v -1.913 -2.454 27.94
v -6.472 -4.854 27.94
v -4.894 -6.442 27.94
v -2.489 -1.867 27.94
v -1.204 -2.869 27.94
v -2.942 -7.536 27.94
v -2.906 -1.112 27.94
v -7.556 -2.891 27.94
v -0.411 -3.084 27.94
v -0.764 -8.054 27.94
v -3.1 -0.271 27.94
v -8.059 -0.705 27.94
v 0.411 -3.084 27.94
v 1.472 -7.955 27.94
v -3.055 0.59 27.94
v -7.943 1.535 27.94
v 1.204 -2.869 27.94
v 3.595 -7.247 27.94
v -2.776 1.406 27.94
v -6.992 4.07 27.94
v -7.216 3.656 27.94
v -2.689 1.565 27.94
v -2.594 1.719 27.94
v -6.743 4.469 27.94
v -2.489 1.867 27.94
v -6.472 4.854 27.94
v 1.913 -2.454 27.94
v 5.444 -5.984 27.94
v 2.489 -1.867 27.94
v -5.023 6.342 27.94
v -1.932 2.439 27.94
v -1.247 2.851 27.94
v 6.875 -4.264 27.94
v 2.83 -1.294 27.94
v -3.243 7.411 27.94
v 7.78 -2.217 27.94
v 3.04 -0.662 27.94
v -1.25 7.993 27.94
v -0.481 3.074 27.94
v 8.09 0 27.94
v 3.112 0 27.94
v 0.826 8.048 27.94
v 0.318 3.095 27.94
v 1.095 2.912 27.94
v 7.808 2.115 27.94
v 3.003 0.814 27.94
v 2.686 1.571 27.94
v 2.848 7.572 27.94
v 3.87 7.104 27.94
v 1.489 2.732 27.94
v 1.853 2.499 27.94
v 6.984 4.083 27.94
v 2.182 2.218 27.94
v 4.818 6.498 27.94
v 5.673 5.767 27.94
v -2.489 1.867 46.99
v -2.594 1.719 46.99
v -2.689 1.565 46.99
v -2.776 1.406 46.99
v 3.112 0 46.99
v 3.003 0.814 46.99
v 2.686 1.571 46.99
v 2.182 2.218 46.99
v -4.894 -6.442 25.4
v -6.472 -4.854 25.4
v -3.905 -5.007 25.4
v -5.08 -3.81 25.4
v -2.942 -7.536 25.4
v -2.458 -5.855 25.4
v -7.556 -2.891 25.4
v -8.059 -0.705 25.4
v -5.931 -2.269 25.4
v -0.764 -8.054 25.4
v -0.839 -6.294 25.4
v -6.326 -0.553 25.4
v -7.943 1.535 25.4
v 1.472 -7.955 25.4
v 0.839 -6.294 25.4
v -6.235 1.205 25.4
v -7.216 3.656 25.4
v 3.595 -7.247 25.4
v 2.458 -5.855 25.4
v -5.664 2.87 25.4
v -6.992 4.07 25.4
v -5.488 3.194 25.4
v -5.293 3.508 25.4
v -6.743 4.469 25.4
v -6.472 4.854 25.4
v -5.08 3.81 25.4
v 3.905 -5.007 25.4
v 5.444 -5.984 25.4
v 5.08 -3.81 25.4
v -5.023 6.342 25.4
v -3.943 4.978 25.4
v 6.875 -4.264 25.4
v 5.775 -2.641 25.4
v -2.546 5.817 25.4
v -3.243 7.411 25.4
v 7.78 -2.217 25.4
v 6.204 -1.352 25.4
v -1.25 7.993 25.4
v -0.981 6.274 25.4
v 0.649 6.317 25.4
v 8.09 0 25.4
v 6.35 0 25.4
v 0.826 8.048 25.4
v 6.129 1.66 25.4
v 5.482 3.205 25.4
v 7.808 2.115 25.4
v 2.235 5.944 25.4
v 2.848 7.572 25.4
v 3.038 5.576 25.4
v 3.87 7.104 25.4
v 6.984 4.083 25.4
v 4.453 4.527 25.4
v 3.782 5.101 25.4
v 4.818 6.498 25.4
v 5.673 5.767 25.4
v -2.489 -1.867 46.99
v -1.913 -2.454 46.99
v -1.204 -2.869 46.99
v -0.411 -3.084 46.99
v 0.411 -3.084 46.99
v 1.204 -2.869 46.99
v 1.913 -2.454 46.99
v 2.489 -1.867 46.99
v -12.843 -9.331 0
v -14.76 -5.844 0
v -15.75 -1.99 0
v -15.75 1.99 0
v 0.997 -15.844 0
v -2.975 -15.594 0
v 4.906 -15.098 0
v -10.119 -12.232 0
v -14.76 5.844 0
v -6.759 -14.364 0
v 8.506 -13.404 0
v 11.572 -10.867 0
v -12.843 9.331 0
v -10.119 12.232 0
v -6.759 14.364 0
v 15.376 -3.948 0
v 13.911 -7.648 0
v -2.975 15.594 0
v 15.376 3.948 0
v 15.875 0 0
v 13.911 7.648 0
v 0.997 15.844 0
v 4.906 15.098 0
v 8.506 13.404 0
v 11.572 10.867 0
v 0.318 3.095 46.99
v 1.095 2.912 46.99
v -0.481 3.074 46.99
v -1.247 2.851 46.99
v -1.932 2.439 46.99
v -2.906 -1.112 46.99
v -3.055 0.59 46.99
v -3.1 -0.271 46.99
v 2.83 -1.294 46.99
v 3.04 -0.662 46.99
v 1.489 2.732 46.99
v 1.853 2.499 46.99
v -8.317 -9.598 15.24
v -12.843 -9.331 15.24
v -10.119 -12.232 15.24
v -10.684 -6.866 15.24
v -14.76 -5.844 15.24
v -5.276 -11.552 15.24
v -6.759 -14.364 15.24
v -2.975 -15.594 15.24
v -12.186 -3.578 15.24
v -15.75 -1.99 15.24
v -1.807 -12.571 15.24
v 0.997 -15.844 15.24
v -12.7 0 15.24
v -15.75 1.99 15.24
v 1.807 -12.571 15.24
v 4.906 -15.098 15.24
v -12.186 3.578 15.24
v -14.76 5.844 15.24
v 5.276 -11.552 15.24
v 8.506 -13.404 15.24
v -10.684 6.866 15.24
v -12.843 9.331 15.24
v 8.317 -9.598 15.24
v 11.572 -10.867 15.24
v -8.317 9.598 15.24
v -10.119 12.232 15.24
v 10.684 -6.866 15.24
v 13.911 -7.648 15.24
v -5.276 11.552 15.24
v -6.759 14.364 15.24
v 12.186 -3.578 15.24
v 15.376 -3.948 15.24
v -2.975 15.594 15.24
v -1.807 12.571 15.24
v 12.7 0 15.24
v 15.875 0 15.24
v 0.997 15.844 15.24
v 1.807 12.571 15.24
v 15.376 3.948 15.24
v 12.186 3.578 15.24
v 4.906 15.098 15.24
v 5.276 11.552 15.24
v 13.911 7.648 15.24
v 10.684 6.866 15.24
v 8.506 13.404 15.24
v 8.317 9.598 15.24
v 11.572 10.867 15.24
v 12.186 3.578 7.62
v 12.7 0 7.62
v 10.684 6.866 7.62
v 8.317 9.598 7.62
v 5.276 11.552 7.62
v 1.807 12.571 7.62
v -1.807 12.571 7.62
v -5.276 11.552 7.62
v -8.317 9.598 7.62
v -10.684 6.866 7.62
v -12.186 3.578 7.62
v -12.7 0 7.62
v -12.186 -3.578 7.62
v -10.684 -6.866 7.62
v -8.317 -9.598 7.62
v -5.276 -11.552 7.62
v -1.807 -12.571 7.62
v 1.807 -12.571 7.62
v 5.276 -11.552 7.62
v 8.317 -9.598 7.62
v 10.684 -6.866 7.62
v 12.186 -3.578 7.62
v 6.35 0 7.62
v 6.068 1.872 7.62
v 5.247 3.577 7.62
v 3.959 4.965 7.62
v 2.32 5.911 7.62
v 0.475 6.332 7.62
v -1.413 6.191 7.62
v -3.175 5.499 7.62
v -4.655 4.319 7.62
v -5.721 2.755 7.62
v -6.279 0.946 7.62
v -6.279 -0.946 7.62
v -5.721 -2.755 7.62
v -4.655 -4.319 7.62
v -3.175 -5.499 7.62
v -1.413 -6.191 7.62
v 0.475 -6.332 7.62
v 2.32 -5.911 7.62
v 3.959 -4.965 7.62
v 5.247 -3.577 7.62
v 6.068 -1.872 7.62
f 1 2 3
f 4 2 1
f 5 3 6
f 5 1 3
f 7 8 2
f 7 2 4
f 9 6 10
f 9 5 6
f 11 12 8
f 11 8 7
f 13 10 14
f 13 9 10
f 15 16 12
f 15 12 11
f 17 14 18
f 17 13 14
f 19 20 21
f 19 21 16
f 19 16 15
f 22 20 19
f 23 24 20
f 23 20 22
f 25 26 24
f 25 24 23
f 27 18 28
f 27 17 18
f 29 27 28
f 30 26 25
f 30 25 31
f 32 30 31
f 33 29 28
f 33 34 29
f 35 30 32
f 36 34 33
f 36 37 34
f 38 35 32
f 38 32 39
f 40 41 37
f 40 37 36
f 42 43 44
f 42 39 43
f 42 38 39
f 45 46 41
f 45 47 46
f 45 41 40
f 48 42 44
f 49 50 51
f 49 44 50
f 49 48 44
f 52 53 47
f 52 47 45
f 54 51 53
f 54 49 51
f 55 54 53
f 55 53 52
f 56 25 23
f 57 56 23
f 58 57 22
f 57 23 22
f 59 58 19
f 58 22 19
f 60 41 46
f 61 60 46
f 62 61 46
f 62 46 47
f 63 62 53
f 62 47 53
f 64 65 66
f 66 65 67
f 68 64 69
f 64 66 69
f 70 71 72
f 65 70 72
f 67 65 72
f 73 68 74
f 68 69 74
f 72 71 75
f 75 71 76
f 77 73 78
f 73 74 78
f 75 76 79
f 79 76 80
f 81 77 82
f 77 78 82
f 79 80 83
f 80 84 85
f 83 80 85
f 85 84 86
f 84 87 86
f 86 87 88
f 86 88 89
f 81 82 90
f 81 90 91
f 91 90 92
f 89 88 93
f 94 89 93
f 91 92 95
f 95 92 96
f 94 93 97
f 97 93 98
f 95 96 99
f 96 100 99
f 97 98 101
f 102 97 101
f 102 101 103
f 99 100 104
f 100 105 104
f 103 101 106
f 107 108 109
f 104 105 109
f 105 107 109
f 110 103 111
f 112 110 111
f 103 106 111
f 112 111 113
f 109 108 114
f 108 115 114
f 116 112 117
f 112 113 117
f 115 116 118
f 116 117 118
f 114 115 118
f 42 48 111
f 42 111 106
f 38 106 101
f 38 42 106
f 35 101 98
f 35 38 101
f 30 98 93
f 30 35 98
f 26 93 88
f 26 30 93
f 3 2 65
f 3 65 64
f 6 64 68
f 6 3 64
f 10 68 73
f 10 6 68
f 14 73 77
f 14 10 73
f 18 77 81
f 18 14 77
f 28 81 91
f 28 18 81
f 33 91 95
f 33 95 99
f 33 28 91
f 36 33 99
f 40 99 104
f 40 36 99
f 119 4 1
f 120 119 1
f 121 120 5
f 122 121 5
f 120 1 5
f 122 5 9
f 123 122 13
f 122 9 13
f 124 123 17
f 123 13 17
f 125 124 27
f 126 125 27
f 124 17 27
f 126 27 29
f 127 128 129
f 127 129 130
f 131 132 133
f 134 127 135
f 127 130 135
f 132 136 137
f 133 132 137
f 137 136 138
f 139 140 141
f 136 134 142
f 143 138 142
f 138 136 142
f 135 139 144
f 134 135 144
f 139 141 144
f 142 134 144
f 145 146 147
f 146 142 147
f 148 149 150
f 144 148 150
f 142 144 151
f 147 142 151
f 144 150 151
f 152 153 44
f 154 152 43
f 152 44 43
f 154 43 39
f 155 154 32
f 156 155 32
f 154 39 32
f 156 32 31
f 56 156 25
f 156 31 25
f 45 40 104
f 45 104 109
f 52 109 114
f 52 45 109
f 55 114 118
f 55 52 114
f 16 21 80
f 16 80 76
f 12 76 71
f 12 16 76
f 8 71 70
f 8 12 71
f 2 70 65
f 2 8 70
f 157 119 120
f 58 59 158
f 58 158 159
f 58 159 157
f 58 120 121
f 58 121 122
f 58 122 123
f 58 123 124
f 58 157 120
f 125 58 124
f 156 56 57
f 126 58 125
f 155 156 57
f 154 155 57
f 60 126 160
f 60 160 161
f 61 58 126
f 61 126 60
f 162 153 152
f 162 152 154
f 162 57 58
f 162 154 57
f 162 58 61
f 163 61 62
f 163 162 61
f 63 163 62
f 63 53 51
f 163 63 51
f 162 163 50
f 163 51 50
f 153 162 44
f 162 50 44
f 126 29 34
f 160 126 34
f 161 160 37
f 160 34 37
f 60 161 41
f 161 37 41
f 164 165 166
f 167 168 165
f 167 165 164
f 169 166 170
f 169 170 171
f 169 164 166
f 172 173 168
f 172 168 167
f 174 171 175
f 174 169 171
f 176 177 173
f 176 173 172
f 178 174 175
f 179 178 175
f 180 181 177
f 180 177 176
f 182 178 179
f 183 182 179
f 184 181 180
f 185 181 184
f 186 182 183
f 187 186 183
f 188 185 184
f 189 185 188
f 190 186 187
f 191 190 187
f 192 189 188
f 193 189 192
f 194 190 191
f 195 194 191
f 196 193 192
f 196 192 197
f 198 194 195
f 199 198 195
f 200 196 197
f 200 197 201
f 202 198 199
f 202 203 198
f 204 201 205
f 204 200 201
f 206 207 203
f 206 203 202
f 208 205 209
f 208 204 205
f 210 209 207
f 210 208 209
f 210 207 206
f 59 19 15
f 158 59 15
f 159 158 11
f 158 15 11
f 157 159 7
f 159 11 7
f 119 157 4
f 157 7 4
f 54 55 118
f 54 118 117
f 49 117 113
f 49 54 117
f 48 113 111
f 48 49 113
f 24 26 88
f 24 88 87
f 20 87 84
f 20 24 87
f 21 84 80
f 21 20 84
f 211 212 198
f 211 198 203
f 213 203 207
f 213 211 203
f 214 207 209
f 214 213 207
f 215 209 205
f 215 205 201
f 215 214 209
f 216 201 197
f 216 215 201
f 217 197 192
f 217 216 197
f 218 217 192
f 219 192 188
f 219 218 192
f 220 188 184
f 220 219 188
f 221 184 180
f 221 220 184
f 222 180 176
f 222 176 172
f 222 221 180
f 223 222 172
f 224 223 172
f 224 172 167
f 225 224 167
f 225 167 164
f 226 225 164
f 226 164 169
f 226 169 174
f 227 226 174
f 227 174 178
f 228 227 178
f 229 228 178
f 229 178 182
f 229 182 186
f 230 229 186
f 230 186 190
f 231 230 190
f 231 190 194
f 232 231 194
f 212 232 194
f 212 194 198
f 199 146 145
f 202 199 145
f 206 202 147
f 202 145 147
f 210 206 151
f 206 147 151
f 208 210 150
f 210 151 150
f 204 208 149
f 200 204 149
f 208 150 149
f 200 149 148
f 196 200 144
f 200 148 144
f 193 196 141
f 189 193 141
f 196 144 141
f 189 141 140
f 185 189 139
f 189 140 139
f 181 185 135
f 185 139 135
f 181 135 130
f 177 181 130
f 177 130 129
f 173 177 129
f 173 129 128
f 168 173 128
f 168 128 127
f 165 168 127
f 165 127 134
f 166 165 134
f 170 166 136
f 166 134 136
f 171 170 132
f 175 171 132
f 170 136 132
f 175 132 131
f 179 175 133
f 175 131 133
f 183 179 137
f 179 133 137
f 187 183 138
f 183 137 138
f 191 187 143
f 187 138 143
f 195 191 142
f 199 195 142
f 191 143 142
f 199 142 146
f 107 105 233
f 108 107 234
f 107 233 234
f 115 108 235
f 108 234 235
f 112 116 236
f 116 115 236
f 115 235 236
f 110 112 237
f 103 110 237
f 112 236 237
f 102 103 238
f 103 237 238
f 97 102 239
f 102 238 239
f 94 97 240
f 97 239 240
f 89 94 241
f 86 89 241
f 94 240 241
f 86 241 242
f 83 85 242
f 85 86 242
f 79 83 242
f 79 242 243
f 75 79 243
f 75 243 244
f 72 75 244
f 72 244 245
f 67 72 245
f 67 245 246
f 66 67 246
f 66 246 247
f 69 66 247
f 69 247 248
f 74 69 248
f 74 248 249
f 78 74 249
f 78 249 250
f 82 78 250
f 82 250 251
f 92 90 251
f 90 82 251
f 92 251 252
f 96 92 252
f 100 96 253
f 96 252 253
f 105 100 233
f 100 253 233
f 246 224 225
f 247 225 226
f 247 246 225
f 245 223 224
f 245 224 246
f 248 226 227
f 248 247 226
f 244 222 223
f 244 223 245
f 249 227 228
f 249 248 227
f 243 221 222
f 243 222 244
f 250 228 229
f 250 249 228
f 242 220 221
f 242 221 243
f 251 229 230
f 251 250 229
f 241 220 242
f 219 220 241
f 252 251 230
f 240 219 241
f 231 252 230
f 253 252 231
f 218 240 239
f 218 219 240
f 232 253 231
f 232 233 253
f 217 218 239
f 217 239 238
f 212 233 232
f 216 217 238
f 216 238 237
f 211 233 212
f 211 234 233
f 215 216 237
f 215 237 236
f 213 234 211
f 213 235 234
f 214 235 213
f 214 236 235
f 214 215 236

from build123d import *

# Parameters (mm, degrees)
F0_R     = 12.7
F0_R_2   = 6.35
F1_DEPTH = 7.62
F0_R_3   = 15.875
F2_DEPTH = 15.24
F3_DEPTH = 27.94
F5_DEPTH = 19.05
F6_DEPTH = 2.54


with BuildPart() as f1:
    # F0 (on Top) → F1 (new body)
    with BuildSketch(Plane.XY):
        Circle(F0_R)
        Circle(F0_R_2, mode=Mode.SUBTRACT)
    extrude(amount=F1_DEPTH)

    # F0 (on Top) → F2 (join)
    with BuildSketch(Plane.XY):
        Circle(F0_R_3)
        Circle(F0_R, mode=Mode.SUBTRACT)
    extrude(amount=F2_DEPTH)

    # F0 (on Top) → F3 (join)
    with BuildSketch(Plane.XY):
        Circle(F0_R_2)
    extrude(amount=F3_DEPTH)

    # F4 (on face) → F5 (join)
    with BuildSketch(Plane.XY.offset(27.94)):
        with BuildLine():
            Line((0, 0), (2.4892, -1.8669))
            ThreePointArc((2.4892, -1.8669), (2.9518280819, -0.983942694), (3.1115, 0))
            ThreePointArc((3.1115, 0), (2.8697186557, 1.2025585587), (2.1819502092, 2.2182257628))
            Line((2.1819502092, 2.2182257628), (0, 0))
        make_face()
        with BuildLine():
            ThreePointArc((2.1819502092, 2.2182257628), (1.6749519392, 2.6222067522), (1.095248, 2.912364))
            Line((1.095248, 2.912364), (0, 0))
            Line((0, 0), (2.1819502092, 2.2182257628))
        make_face()
        with BuildLine():
            ThreePointArc((-2.7755672417, 1.4062925502), (-3.0996598031, -0.2711850936), (-2.4892, -1.8669))
            Line((-2.4892, -1.8669), (0, 0))
            Line((0, 0), (-2.7755672417, 1.4062925502))
        make_face()
        with BuildLine():
            Line((0, 0), (-2.4892, 1.8669))
            ThreePointArc((-2.4892, 1.8669), (-2.6424388986, 1.642847807), (-2.7755672417, 1.4062925502))
            Line((-2.7755672417, 1.4062925502), (0, 0))
        make_face()
        with BuildLine():
            Line((0, 0), (1.095248, 2.912364))
            ThreePointArc((1.095248, 2.912364), (-0.87122, 2.98704), (-2.4892, 1.8669))
            Line((-2.4892, 1.8669), (0, 0))
        make_face()
        with BuildLine():
            ThreePointArc((-2.4892, -1.8669), (0, -3.1115), (2.4892, -1.8669))
            Line((2.4892, -1.8669), (0, 0))
            Line((0, 0), (-2.4892, -1.8669))
        make_face()
    extrude(amount=F5_DEPTH)

    # F4 (on face) → F6 (join)
    with BuildSketch(Plane.XY.offset(27.94)):
        with BuildLine():
            ThreePointArc((-7.2164748284, 3.6563606306), (-8.0591154881, -0.7050812433), (-6.47192, -4.85394))
            Line((-6.47192, -4.85394), (-5.08, -3.81))
            ThreePointArc((-5.08, -3.81), (-6.3258363329, -0.5534389664), (-5.6644229422, 2.8699847964))
            Line((-5.6644229422, 2.8699847964), (-7.2164748284, 3.6563606306))
        make_face()
        with BuildLine():
            Line((-5.08, 3.81), (-6.47192, 4.85394))
            ThreePointArc((-6.47192, 4.85394), (-6.8703411364, 4.2714042983), (-7.2164748284, 3.6563606306))
            Line((-7.2164748284, 3.6563606306), (-5.6644229422, 2.8699847964))
            ThreePointArc((-5.6644229422, 2.8699847964), (-5.3927324462, 3.3527506266), (-5.08, 3.81))
        make_face()
        with BuildLine():
            Line((2.2352, 5.9436), (2.8476448, 7.5721464))
            ThreePointArc((2.8476448, 7.5721464), (-2.265172, 7.766304), (-6.47192, 4.85394))
            Line((-6.47192, 4.85394), (-5.08, 3.81))
            ThreePointArc((-5.08, 3.81), (-1.778, 6.096), (2.2352, 5.9436))
        make_face()
        with BuildLine():
            ThreePointArc((5.6730705438, 5.7673869833), (4.3548750419, 6.8177375558), (2.8476448, 7.5721464))
            Line((2.8476448, 7.5721464), (2.2352, 5.9436))
            ThreePointArc((2.2352, 5.9436), (3.4182692637, 5.3514423515), (4.4529596105, 4.5269913526))
            Line((4.4529596105, 4.5269913526), (5.6730705438, 5.7673869833))
        make_face()
        with BuildLine():
            Line((5.08, -3.81), (6.47192, -4.85394))
            ThreePointArc((6.47192, -4.85394), (7.6747530129, -2.5582510043), (8.0899, 0))
            ThreePointArc((8.0899, 0), (7.4612685048, 3.1266522526), (5.6730705438, 5.7673869833))
            Line((5.6730705438, 5.7673869833), (4.4529596105, 4.5269913526))
            ThreePointArc((4.4529596105, 4.5269913526), (5.8565686851, 2.4542011402), (6.35, 0))
            ThreePointArc((6.35, 0), (6.0241389426, -2.0080463142), (5.08, -3.81))
        make_face()
        with BuildLine():
            ThreePointArc((-6.47192, -4.85394), (0, -8.0899), (6.47192, -4.85394))
            Line((6.47192, -4.85394), (5.08, -3.81))
            ThreePointArc((5.08, -3.81), (0, -6.35), (-5.08, -3.81))
            Line((-5.08, -3.81), (-6.47192, -4.85394))
        make_face()
    extrude(amount=-F6_DEPTH)


solid = f1.part
